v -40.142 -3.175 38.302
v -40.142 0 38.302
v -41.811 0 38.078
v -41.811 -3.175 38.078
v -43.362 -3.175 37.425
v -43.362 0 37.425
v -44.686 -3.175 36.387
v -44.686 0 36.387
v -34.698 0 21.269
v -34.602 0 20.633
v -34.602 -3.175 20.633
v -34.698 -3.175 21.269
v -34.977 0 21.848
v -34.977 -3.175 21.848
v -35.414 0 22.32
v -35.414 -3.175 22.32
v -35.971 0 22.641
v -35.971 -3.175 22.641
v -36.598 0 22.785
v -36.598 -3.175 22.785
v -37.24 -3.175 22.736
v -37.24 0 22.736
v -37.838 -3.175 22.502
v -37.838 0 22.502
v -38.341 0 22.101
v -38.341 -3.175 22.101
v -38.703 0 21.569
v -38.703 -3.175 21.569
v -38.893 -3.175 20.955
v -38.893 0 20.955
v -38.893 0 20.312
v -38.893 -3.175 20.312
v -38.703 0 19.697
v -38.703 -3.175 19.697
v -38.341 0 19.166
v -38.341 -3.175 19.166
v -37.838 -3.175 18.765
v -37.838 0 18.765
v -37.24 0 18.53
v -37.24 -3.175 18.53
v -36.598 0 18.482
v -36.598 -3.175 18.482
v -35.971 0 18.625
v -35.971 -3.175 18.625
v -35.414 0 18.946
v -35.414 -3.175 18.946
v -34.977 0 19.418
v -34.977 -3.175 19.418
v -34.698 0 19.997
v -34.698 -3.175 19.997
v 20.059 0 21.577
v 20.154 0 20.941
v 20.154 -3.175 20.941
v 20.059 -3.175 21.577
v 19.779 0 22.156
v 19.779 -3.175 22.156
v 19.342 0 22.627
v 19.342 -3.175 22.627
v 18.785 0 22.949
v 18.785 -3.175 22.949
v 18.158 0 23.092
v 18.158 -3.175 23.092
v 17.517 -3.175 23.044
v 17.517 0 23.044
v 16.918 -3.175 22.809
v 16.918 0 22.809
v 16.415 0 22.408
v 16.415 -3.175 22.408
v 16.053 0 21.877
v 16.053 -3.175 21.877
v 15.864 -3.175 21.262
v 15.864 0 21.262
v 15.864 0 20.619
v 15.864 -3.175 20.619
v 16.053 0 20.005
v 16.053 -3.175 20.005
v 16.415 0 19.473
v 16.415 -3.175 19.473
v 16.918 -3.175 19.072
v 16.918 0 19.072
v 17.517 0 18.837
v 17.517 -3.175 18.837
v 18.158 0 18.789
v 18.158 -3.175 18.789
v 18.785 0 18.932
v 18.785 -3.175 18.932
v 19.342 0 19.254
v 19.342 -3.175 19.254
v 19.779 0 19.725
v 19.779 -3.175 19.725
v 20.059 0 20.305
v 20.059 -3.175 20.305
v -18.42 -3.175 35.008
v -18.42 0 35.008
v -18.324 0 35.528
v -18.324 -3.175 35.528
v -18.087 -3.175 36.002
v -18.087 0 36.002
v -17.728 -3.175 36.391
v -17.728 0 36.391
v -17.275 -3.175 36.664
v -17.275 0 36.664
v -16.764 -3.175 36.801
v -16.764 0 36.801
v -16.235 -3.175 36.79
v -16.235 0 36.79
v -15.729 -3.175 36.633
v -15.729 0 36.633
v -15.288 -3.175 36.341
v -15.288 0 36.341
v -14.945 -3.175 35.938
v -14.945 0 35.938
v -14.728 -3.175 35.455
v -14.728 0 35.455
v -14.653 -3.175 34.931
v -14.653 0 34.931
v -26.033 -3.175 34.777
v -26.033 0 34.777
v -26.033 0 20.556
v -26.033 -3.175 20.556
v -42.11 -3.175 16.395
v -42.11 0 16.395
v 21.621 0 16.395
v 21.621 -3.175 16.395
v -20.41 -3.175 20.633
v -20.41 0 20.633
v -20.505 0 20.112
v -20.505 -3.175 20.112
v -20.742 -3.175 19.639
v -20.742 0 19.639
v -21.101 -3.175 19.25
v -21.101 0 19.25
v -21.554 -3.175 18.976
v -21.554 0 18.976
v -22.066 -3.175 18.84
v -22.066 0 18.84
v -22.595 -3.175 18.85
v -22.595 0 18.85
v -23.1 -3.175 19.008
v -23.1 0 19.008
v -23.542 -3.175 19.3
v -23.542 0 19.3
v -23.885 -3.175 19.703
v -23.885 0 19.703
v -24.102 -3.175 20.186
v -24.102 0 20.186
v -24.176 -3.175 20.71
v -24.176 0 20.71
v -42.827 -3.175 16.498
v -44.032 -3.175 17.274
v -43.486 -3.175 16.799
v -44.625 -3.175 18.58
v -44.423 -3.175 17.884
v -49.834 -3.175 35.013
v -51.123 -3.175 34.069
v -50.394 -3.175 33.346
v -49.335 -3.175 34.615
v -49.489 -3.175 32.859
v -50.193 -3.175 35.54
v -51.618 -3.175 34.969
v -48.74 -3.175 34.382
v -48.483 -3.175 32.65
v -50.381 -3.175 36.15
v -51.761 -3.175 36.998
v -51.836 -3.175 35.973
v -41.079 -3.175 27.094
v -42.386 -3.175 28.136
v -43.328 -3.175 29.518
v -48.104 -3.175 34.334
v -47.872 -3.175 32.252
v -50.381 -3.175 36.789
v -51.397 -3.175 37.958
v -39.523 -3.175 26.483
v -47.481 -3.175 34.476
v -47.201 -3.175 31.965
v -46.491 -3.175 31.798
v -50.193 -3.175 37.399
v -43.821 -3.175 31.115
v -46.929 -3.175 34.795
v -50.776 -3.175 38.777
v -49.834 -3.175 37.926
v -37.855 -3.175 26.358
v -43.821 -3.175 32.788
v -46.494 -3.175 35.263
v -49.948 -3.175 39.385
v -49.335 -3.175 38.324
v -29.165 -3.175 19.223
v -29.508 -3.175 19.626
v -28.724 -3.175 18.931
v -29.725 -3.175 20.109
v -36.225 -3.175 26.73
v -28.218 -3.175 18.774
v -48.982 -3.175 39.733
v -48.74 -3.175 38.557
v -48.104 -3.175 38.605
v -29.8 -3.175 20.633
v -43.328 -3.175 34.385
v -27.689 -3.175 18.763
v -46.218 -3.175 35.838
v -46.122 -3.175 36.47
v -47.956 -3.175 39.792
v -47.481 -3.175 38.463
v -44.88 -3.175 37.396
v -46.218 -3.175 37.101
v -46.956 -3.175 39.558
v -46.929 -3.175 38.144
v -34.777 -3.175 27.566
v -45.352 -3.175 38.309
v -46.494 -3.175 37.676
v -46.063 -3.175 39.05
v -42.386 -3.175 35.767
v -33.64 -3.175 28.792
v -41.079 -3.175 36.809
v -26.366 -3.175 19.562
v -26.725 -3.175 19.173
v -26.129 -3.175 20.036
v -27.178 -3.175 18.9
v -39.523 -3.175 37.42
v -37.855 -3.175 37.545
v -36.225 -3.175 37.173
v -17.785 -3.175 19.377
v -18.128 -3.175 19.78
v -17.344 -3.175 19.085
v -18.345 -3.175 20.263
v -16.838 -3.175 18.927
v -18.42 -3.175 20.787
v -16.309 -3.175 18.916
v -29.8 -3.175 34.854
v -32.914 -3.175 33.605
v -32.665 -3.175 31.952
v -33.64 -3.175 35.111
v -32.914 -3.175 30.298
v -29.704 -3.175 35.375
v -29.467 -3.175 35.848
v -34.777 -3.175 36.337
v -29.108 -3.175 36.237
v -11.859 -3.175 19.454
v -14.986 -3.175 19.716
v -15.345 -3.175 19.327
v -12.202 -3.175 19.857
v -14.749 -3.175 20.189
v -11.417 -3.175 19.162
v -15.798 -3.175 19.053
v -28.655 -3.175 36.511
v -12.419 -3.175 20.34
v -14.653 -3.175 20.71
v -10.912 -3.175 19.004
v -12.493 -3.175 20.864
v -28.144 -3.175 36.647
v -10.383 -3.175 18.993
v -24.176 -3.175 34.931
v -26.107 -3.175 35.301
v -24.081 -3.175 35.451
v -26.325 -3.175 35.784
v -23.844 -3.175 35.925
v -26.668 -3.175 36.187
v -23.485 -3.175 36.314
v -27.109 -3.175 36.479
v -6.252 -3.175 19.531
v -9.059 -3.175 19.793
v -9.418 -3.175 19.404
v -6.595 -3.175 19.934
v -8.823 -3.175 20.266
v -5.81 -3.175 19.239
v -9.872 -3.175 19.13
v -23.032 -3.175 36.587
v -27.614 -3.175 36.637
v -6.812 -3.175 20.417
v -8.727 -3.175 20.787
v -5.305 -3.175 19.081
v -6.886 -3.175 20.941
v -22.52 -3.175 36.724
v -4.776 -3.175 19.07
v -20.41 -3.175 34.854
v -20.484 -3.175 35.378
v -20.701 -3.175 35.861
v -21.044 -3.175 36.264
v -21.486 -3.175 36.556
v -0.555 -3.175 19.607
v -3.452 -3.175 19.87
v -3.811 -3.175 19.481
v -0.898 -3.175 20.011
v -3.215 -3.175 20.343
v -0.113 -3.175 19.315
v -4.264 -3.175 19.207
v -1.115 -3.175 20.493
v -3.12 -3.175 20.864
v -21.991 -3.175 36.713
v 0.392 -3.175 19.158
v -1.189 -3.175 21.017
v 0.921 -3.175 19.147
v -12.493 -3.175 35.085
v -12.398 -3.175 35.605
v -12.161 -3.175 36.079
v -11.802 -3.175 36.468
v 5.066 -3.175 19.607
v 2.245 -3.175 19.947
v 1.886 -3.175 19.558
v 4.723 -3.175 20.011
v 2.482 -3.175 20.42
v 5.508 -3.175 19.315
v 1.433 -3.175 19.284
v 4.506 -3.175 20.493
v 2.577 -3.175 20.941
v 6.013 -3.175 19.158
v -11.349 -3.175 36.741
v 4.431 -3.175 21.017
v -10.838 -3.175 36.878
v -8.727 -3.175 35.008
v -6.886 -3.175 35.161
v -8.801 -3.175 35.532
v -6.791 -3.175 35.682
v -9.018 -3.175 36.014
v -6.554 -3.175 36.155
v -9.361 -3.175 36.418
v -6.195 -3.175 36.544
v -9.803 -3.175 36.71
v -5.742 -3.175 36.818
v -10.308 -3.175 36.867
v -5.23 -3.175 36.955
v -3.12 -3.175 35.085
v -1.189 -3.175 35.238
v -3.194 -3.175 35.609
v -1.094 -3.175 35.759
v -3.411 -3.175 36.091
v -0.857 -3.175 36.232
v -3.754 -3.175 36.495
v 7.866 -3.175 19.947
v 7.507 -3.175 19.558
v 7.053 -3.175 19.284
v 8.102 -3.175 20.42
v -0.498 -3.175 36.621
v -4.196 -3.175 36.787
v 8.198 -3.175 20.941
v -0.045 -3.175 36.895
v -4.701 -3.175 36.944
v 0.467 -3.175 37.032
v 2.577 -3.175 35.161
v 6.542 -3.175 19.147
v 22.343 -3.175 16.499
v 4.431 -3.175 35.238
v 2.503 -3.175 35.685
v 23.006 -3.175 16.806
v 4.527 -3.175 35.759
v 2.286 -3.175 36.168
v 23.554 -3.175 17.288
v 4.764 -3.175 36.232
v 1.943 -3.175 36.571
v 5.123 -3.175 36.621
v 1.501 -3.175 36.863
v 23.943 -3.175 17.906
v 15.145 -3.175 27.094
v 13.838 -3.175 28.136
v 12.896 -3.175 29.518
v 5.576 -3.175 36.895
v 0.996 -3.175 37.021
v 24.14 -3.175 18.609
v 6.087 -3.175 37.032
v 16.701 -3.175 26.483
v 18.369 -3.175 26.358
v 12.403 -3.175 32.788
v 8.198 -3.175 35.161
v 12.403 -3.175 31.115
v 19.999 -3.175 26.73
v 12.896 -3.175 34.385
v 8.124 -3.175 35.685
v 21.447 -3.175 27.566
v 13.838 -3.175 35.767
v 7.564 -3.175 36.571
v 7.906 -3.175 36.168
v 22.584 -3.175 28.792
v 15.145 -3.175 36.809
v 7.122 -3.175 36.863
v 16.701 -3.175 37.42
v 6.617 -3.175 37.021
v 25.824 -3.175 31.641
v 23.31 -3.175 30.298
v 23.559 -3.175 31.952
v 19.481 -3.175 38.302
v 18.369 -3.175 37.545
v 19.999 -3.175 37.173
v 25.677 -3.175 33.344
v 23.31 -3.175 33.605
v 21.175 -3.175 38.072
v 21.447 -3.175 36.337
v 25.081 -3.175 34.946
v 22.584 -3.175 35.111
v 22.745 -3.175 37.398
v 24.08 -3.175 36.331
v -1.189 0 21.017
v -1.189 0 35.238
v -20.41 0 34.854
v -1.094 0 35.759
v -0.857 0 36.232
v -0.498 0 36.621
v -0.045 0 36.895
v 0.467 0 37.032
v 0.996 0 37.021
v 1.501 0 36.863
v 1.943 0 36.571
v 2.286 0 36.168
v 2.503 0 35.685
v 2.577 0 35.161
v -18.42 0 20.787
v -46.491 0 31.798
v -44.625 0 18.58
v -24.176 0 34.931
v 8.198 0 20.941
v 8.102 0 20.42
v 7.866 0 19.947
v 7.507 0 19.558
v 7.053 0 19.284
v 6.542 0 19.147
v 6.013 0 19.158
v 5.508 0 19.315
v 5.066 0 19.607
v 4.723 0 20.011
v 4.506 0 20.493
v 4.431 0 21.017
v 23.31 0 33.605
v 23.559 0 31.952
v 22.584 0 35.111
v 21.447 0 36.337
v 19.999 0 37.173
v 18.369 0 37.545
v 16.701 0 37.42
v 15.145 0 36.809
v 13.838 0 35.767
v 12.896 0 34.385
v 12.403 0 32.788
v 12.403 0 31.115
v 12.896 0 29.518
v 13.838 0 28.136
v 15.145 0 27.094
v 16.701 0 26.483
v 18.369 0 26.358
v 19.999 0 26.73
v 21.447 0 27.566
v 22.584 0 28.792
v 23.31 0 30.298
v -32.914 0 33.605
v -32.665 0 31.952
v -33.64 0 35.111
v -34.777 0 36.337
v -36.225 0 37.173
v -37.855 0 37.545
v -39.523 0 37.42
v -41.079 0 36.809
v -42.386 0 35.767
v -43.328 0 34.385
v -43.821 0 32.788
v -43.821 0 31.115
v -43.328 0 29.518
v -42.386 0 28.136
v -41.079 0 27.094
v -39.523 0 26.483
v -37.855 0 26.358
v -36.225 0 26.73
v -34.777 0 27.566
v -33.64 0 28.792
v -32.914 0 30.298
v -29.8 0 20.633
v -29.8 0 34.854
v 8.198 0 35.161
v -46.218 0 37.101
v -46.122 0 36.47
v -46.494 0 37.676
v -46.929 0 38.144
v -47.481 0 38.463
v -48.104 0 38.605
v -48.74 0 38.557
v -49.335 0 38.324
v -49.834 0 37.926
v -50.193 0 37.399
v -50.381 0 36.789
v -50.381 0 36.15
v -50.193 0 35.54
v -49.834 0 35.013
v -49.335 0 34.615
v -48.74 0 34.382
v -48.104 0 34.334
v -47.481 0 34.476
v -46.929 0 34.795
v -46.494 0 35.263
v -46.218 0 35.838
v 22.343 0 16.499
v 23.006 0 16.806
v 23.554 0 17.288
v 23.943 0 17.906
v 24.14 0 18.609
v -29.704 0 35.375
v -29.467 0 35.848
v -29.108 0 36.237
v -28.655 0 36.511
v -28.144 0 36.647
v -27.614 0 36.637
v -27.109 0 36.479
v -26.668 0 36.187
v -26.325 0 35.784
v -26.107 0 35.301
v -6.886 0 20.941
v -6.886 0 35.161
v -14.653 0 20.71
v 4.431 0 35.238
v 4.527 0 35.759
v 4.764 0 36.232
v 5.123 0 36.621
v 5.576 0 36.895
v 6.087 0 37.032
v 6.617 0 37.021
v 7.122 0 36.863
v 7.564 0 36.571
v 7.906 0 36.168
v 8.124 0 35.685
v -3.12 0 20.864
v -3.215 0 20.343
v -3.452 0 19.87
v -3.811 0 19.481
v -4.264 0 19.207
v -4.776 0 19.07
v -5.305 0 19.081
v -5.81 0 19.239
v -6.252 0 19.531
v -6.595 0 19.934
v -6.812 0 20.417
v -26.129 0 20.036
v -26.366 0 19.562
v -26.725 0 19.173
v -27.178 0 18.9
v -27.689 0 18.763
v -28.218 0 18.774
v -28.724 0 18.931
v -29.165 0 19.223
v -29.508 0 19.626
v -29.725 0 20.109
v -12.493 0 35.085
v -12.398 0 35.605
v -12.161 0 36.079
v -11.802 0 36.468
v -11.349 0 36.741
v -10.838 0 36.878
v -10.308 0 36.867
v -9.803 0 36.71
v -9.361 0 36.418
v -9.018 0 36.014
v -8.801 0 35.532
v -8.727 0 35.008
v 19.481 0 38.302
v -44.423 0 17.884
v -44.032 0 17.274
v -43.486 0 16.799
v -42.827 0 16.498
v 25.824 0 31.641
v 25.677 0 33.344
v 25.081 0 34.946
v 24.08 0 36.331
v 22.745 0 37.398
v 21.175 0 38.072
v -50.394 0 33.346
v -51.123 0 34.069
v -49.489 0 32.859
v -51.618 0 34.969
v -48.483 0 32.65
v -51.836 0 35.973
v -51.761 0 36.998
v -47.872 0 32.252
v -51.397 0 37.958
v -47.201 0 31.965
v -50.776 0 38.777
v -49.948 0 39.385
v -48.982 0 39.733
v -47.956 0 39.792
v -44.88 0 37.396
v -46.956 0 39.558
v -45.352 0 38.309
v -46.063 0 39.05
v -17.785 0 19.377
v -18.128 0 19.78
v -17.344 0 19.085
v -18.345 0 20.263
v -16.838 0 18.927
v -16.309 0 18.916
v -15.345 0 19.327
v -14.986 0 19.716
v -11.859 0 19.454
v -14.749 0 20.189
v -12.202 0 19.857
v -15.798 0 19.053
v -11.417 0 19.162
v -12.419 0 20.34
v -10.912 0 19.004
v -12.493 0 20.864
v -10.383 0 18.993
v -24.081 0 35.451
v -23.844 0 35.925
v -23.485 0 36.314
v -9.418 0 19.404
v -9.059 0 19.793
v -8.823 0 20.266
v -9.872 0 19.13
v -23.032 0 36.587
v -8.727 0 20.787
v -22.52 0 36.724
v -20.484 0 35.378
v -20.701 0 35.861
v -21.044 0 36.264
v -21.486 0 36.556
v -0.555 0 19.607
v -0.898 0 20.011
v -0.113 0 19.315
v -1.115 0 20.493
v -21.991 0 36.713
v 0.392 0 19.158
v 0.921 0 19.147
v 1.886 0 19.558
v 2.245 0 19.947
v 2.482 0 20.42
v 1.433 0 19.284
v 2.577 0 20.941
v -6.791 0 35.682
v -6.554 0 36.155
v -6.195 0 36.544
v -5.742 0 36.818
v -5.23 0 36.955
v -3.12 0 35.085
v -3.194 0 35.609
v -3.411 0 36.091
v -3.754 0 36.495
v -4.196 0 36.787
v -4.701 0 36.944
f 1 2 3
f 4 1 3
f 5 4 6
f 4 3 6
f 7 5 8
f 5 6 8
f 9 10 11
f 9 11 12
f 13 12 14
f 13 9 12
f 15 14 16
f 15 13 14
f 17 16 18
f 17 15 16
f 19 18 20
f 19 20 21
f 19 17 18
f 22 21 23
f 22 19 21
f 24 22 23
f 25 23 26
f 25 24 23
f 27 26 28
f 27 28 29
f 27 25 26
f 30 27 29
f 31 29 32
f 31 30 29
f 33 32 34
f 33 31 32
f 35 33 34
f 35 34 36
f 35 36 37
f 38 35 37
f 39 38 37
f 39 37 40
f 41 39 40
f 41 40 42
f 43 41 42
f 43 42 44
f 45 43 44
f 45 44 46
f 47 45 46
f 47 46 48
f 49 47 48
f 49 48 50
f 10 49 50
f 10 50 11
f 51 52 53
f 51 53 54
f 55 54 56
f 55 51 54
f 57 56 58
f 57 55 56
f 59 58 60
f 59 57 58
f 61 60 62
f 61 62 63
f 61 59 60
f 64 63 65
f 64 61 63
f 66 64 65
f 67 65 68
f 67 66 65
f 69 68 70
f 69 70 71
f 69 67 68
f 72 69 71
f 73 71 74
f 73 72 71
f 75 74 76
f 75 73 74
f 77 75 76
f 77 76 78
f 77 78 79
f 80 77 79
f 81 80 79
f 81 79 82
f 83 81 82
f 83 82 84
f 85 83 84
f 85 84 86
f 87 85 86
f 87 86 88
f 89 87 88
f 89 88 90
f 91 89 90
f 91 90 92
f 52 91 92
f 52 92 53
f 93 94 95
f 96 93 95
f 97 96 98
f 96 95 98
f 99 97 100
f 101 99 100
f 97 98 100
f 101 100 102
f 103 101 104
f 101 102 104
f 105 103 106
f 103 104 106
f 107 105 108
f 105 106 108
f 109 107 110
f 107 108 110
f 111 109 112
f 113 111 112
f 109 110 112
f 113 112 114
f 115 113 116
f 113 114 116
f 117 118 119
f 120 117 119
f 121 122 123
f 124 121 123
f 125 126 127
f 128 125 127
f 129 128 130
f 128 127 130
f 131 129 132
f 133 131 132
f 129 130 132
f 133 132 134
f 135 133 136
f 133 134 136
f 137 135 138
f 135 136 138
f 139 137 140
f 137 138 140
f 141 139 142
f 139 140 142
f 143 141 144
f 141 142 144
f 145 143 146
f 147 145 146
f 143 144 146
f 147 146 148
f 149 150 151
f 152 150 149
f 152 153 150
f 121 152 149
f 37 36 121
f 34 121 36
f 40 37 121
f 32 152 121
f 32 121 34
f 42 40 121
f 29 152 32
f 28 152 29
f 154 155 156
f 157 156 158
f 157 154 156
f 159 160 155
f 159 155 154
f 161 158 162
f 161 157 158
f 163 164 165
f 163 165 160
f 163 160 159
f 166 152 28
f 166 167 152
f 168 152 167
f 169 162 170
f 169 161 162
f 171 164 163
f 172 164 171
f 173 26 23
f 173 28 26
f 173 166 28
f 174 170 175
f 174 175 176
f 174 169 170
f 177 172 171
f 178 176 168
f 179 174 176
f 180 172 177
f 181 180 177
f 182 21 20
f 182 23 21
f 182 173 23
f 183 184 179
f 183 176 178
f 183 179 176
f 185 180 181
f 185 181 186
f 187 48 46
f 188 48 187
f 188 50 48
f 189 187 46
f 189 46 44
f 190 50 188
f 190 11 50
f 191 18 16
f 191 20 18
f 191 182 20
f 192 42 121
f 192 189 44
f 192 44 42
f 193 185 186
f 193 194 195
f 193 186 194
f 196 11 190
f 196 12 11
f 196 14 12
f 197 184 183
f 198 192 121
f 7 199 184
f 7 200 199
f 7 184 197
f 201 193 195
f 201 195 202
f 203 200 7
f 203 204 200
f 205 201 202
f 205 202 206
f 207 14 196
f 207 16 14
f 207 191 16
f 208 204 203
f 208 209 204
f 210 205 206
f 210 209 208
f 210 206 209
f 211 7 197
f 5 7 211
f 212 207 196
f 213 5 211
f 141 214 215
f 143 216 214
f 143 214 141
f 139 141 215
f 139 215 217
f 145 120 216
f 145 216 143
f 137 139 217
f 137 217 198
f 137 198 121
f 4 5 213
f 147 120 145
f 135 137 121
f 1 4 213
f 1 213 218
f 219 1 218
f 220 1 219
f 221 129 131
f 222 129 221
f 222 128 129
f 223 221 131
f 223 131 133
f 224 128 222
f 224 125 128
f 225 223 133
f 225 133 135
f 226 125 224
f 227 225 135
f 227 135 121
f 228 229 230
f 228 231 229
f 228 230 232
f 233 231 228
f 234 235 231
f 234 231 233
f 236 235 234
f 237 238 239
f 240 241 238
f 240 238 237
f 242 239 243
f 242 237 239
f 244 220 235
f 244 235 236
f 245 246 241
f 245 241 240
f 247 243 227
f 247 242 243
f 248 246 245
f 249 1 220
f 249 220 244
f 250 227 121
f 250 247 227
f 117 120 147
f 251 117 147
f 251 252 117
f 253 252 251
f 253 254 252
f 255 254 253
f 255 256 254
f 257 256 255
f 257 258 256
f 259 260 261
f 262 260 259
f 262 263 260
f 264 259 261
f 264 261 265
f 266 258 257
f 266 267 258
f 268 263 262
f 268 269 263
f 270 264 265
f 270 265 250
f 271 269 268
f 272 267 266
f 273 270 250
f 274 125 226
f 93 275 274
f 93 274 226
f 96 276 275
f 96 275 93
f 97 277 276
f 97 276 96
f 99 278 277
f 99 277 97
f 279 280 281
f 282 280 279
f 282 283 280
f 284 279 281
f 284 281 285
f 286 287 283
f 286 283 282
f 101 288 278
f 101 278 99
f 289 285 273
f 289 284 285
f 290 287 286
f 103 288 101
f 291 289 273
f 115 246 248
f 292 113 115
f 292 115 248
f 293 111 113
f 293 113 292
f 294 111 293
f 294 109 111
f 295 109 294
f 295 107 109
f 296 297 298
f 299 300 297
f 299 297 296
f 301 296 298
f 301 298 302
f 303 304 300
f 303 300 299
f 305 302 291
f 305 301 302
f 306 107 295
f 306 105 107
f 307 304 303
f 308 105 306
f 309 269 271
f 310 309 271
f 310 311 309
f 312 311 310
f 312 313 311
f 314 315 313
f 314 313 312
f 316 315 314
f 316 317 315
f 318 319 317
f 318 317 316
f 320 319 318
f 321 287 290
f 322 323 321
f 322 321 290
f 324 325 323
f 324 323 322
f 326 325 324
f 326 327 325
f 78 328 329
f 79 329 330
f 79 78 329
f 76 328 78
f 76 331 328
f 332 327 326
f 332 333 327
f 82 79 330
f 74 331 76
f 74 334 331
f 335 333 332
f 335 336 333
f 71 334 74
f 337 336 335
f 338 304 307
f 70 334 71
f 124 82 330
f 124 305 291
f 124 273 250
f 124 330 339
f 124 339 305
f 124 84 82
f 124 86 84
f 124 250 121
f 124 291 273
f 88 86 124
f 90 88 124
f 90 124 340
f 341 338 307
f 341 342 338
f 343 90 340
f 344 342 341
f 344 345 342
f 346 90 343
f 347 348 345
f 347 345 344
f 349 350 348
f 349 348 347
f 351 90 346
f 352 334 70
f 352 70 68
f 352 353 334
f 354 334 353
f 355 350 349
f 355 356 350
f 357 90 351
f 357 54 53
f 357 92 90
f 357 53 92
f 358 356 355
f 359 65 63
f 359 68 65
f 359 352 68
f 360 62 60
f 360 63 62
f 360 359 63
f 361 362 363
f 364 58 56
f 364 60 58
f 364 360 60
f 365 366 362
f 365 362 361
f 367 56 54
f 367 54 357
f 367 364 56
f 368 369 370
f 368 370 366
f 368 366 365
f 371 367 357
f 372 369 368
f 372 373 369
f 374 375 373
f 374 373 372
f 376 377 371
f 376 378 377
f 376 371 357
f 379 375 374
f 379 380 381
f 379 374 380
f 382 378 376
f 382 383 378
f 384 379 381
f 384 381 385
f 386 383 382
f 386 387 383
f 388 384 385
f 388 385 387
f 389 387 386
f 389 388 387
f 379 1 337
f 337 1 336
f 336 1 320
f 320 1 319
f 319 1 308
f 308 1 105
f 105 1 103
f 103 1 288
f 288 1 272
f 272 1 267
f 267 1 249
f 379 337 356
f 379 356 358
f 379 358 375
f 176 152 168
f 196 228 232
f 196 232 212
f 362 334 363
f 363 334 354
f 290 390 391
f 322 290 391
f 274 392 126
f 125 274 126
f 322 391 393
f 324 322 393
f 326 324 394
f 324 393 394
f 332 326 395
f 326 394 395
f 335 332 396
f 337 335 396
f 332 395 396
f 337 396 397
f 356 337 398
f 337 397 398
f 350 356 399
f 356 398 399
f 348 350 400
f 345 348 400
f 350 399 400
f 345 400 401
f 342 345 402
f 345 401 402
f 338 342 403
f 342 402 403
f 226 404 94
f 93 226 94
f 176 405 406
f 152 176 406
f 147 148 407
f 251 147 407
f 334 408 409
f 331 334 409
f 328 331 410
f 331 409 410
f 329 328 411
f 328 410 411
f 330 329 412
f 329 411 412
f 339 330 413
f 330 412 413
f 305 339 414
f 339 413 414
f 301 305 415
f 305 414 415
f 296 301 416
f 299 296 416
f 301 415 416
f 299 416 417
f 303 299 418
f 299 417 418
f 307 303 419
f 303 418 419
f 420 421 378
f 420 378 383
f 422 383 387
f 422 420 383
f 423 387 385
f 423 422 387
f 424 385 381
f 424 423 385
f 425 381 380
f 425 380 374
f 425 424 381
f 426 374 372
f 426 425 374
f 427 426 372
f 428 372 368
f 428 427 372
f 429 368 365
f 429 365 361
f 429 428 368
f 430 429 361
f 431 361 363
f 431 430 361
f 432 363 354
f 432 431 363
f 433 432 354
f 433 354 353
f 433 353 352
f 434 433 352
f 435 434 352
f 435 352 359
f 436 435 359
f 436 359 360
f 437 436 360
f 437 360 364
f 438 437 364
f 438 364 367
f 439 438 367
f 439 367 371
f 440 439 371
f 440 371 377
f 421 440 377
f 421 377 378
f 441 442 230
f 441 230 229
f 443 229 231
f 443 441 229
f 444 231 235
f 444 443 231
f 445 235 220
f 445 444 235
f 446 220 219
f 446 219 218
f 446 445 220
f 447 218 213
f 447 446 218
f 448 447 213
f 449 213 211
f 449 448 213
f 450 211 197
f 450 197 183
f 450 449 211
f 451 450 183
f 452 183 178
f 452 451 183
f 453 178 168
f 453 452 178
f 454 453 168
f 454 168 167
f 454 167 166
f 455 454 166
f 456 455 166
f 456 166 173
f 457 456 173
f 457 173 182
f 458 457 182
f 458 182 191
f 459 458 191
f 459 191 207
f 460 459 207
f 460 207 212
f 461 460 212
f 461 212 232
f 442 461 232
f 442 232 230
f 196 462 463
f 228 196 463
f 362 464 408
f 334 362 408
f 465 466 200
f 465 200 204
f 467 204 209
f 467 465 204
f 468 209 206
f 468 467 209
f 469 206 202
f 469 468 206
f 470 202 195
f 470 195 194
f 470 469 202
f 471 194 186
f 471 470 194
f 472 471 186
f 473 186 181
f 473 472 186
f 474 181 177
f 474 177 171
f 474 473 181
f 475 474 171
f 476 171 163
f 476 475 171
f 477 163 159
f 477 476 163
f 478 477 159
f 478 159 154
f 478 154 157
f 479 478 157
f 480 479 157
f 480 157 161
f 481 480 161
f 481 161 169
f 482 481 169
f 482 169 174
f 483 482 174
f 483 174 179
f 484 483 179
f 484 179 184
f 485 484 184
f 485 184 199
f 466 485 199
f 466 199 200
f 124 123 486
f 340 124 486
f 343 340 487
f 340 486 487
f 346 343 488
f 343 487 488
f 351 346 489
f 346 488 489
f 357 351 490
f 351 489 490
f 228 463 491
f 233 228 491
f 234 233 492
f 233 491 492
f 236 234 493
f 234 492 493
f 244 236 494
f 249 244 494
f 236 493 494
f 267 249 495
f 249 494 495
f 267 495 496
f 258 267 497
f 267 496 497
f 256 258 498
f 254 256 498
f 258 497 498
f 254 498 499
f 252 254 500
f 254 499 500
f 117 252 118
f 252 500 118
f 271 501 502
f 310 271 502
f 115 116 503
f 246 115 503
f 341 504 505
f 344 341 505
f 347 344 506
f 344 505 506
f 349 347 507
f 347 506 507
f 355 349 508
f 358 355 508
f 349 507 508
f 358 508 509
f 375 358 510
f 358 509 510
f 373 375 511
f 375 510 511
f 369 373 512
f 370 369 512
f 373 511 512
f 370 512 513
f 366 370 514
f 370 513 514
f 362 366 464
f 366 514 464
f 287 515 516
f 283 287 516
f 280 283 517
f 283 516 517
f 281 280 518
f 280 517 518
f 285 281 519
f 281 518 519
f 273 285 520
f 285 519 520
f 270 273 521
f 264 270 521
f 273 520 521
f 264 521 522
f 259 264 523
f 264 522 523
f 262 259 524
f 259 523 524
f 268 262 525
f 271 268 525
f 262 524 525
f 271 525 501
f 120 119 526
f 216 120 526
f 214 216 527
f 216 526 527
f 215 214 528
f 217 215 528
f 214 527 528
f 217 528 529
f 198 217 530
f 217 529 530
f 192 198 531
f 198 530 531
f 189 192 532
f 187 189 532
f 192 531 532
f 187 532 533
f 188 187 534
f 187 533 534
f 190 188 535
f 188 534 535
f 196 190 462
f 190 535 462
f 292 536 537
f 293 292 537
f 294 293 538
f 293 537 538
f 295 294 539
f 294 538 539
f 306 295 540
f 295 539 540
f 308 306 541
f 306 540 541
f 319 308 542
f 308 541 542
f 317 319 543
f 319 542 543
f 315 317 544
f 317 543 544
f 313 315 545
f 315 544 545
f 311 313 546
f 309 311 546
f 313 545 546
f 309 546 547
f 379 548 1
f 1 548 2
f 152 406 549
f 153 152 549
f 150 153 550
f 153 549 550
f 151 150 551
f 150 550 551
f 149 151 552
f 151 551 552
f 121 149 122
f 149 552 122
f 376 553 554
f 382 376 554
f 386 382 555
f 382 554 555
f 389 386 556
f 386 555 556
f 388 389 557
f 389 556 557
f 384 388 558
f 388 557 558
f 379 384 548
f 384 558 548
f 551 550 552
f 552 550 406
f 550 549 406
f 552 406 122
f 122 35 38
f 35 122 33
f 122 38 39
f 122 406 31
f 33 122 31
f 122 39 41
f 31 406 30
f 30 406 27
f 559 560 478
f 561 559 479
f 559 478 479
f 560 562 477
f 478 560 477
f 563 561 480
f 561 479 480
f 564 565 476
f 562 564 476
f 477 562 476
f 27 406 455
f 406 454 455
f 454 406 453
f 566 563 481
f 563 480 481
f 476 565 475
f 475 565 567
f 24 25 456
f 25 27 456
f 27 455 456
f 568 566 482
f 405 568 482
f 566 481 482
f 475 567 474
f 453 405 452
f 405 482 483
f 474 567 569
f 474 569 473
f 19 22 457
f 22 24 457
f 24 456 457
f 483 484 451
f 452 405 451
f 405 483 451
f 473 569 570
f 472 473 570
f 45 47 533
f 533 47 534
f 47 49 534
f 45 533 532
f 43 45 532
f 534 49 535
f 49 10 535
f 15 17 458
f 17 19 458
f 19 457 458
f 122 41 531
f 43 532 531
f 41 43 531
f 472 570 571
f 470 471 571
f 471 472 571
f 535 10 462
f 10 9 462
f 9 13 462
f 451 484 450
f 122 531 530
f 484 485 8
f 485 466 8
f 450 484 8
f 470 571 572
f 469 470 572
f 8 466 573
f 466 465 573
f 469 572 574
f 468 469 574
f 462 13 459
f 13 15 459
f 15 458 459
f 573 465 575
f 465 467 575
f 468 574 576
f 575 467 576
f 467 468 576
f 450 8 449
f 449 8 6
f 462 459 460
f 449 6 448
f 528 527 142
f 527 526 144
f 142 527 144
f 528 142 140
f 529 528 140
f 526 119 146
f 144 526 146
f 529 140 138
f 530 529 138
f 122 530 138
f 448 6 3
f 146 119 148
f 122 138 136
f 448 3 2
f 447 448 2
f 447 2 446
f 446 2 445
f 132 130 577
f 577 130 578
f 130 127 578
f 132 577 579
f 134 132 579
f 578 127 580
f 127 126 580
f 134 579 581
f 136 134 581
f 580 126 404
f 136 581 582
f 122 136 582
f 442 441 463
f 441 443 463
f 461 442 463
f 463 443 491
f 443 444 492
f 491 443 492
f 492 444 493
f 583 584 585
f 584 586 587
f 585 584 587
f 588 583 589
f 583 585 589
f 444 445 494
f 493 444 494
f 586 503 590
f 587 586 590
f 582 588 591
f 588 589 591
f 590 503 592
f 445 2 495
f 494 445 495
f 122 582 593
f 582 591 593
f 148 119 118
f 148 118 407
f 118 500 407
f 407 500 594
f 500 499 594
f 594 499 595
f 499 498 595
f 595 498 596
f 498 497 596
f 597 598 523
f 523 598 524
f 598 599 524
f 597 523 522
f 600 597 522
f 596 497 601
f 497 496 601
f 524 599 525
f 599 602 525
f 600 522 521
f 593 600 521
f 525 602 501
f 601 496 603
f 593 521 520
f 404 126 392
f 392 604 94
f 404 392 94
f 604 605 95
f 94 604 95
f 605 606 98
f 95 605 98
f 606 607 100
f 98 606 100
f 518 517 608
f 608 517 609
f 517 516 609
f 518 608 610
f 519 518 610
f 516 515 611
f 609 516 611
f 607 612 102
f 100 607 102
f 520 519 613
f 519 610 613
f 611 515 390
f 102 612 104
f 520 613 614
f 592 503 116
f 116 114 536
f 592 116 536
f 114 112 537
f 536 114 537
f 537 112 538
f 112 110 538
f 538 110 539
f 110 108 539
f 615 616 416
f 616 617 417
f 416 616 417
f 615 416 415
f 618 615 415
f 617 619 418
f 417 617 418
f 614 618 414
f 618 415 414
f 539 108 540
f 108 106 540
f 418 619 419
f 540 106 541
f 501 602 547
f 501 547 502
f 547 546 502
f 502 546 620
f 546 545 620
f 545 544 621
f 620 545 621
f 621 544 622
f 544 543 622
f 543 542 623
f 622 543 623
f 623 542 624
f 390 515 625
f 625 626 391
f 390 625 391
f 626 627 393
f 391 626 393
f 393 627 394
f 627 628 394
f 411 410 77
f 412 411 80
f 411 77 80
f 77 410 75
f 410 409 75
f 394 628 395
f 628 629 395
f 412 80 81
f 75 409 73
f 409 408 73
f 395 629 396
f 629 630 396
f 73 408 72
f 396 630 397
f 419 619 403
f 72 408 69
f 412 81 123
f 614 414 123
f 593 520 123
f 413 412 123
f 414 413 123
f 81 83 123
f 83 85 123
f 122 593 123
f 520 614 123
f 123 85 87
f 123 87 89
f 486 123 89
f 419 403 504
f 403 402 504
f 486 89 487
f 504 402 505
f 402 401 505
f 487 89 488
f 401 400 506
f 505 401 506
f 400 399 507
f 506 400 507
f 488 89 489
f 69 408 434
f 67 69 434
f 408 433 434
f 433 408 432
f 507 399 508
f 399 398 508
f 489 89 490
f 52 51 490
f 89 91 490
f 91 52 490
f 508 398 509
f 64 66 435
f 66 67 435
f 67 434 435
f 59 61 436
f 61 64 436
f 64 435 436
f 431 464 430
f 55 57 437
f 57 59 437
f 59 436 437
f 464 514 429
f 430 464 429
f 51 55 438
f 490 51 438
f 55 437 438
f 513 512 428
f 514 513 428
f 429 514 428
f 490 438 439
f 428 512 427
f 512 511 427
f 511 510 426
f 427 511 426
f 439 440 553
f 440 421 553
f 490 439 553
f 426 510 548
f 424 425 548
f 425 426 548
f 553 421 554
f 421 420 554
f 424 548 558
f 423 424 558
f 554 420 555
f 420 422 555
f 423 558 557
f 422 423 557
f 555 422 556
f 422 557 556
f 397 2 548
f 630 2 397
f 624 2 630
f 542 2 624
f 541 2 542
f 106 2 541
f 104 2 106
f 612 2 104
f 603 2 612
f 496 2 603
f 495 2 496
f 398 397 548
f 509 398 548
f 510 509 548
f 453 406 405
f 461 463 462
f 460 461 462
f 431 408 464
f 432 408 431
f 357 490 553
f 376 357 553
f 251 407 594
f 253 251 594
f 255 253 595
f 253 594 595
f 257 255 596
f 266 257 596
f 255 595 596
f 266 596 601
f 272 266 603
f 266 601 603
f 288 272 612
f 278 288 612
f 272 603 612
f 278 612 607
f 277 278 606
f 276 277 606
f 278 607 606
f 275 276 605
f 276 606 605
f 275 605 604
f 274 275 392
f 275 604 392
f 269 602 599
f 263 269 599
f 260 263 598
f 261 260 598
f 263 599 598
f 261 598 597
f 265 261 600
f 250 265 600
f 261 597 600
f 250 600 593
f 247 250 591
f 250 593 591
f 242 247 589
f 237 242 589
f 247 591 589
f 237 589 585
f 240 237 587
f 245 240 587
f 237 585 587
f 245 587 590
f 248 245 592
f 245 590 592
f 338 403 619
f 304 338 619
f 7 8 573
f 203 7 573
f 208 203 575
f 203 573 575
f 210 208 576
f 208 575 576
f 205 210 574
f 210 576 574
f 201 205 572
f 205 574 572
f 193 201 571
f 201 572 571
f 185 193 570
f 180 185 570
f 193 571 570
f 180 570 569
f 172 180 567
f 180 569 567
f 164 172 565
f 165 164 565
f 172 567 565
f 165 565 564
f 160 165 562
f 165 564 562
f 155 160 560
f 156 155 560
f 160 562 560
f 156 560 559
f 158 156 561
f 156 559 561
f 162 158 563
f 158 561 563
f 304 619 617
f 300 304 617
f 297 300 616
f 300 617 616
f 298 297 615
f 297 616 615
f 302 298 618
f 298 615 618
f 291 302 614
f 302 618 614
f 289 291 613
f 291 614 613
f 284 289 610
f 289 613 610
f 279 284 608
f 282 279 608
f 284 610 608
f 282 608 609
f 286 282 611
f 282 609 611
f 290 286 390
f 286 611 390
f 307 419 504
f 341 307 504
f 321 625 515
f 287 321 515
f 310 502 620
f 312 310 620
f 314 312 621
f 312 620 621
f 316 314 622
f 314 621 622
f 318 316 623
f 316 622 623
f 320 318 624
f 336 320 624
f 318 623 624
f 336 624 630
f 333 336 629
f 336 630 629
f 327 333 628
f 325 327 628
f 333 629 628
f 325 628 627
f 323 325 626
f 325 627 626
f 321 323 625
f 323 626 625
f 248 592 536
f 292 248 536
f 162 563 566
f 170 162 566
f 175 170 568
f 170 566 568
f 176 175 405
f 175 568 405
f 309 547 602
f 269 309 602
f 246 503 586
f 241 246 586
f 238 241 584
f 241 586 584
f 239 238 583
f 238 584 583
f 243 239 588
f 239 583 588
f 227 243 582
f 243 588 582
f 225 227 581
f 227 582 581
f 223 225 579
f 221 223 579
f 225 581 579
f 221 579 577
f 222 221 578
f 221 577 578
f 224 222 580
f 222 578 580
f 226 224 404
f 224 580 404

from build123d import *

# Parameters (mm, degrees)
F0_R     = 2.157429
F0_R_2   = 5.60947
F1_DEPTH = 3.175
F0_R_3   = 2.141456
F2_DEPTH = 0.004921
F3_DEPTH = 3.175


with BuildPart() as f1:
    # F0 (on Front) → F1 (new body)
    with BuildSketch(Plane.XZ):
        with BuildLine():
            Line((19.481216, 38.301506), (-40.142396, 38.301506))
            ThreePointArc((-40.142396, 38.301506), (-42.607797, 37.803368), (-44.686392, 36.387111))
            ThreePointArc((-44.686392, 36.387111), (-46.052064, 34.274936), (-46.490546, 31.798229))
            Line((-46.490546, 31.798229), (-44.625234, 18.579618))
            ThreePointArc((-44.625234, 18.579618), (-43.776004, 17.017098), (-42.110151, 16.394528))
            Line((-42.110151, 16.394528), (21.620648, 16.394528))
            ThreePointArc((21.620648, 16.394528), (23.297675, 17.026865), (24.139706, 18.609033))
            Line((24.139706, 18.609033), (25.823629, 31.641185))
            ThreePointArc((25.823629, 31.641185), (24.07975, 36.330545), (19.481216, 38.301506))
        make_face()
        with Locations((-36.75957, 20.633117)):
            Circle(F0_R, mode=Mode.SUBTRACT)
        with BuildLine():
            Line((-29.799683, 20.633117), (-29.799683, 34.853889))
            ThreePointArc((-29.799683, 34.853889), (-27.878732, 36.660702), (-26.0331, 34.777018))
            Line((-26.0331, 34.777018), (-26.0331, 20.556246))
            ThreePointArc((-26.0331, 20.556246), (-27.954051, 18.749433), (-29.799683, 20.633117))
        make_face(mode=Mode.SUBTRACT)
        with BuildLine():
            Line((-24.176236, 20.709988), (-24.176236, 34.93076))
            ThreePointArc((-24.176236, 34.93076), (-22.255285, 36.737572), (-20.409653, 34.853889))
            Line((-20.409653, 34.853889), (-20.409653, 20.633116))
            ThreePointArc((-20.409653, 20.633116), (-22.330604, 18.826304), (-24.176236, 20.709988))
        make_face(mode=Mode.SUBTRACT)
        with BuildLine():
            Line((-18.419787, 20.786859), (-18.419787, 35.007631))
            ThreePointArc((-18.419787, 35.007631), (-16.498836, 36.814444), (-14.653204, 34.93076))
            Line((-14.653204, 34.93076), (-14.653204, 20.709988))
            ThreePointArc((-14.653204, 20.709988), (-16.574155, 18.903175), (-18.419787, 20.786859))
        make_face(mode=Mode.SUBTRACT)
        with Locations((17.996946, 20.940602)):
            Circle(F0_R, mode=Mode.SUBTRACT)
        with BuildLine():
            Line((-12.493486, 20.86373), (-12.493486, 35.084503))
            ThreePointArc((-12.493486, 35.084503), (-10.572535, 36.891315), (-8.726902, 35.007631))
            Line((-8.726902, 35.007631), (-8.726902, 20.786859))
            ThreePointArc((-8.726902, 20.786859), (-10.647853, 18.980047), (-12.493486, 20.86373))
        make_face(mode=Mode.SUBTRACT)
        with BuildLine():
            Line((-6.886294, 20.940602), (-6.886294, 35.161374))
            ThreePointArc((-6.886294, 35.161374), (-4.965343, 36.968187), (-3.11971, 35.084503))
            Line((-3.11971, 35.084503), (-3.11971, 20.86373))
            ThreePointArc((-3.11971, 20.86373), (-5.040661, 19.056918), (-6.886294, 20.940602))
        make_face(mode=Mode.SUBTRACT)
        with BuildLine():
            Line((-1.18931, 21.017473), (-1.18931, 35.238246))
            ThreePointArc((-1.18931, 35.238246), (0.73164, 37.045058), (2.577273, 35.161374))
            Line((2.577273, 35.161374), (2.577273, 20.940602))
            ThreePointArc((2.577273, 20.940602), (0.656322, 19.133789), (-1.18931, 21.017473))
        make_face(mode=Mode.SUBTRACT)
        with BuildLine():
            Line((4.431474, 21.017473), (4.431474, 35.238246))
            ThreePointArc((4.431474, 35.238246), (6.352424, 37.045058), (8.198057, 35.161374))
            Line((8.198057, 35.161374), (8.198057, 20.940602))
            ThreePointArc((8.198057, 20.940602), (6.277106, 19.133789), (4.431474, 21.017473))
        make_face(mode=Mode.SUBTRACT)
        with Locations((-38.274463, 31.951506)):
            Circle(F0_R_2, mode=Mode.SUBTRACT)
        with Locations((17.949626, 31.951506)):
            Circle(F0_R_2, mode=Mode.SUBTRACT)
    extrude(amount=F1_DEPTH)

    # F0 (on Front) → F2 (join)
    with BuildSketch(Plane.XZ):
        with BuildLine():
            Line((19.481216, 38.301506), (-40.142396, 38.301506))
            ThreePointArc((-40.142396, 38.301506), (-42.607797, 37.803368), (-44.686392, 36.387111))
            ThreePointArc((-44.686392, 36.387111), (-46.052064, 34.274936), (-46.490546, 31.798229))
            Line((-46.490546, 31.798229), (-44.625234, 18.579618))
            ThreePointArc((-44.625234, 18.579618), (-43.776004, 17.017098), (-42.110151, 16.394528))
            Line((-42.110151, 16.394528), (21.620648, 16.394528))
            ThreePointArc((21.620648, 16.394528), (23.297675, 17.026865), (24.139706, 18.609033))
            Line((24.139706, 18.609033), (25.823629, 31.641185))
            ThreePointArc((25.823629, 31.641185), (24.07975, 36.330545), (19.481216, 38.301506))
        make_face()
        with Locations((-36.75957, 20.633117)):
            Circle(F0_R, mode=Mode.SUBTRACT)
        with BuildLine():
            Line((-29.799683, 20.633117), (-29.799683, 34.853889))
            ThreePointArc((-29.799683, 34.853889), (-27.878732, 36.660702), (-26.0331, 34.777018))
            Line((-26.0331, 34.777018), (-26.0331, 20.556246))
            ThreePointArc((-26.0331, 20.556246), (-27.954051, 18.749433), (-29.799683, 20.633117))
        make_face(mode=Mode.SUBTRACT)
        with BuildLine():
            Line((-24.176236, 20.709988), (-24.176236, 34.93076))
            ThreePointArc((-24.176236, 34.93076), (-22.255285, 36.737572), (-20.409653, 34.853889))
            Line((-20.409653, 34.853889), (-20.409653, 20.633116))
            ThreePointArc((-20.409653, 20.633116), (-22.330604, 18.826304), (-24.176236, 20.709988))
        make_face(mode=Mode.SUBTRACT)
        with BuildLine():
            Line((-18.419787, 20.786859), (-18.419787, 35.007631))
            ThreePointArc((-18.419787, 35.007631), (-16.498836, 36.814444), (-14.653204, 34.93076))
            Line((-14.653204, 34.93076), (-14.653204, 20.709988))
            ThreePointArc((-14.653204, 20.709988), (-16.574155, 18.903175), (-18.419787, 20.786859))
        make_face(mode=Mode.SUBTRACT)
        with Locations((17.996946, 20.940602)):
            Circle(F0_R, mode=Mode.SUBTRACT)
        with BuildLine():
            Line((-12.493486, 20.86373), (-12.493486, 35.084503))
            ThreePointArc((-12.493486, 35.084503), (-10.572535, 36.891315), (-8.726902, 35.007631))
            Line((-8.726902, 35.007631), (-8.726902, 20.786859))
            ThreePointArc((-8.726902, 20.786859), (-10.647853, 18.980047), (-12.493486, 20.86373))
        make_face(mode=Mode.SUBTRACT)
        with BuildLine():
            Line((-6.886294, 20.940602), (-6.886294, 35.161374))
            ThreePointArc((-6.886294, 35.161374), (-4.965343, 36.968187), (-3.11971, 35.084503))
            Line((-3.11971, 35.084503), (-3.11971, 20.86373))
            ThreePointArc((-3.11971, 20.86373), (-5.040661, 19.056918), (-6.886294, 20.940602))
        make_face(mode=Mode.SUBTRACT)
        with BuildLine():
            Line((-1.18931, 21.017473), (-1.18931, 35.238246))
            ThreePointArc((-1.18931, 35.238246), (0.73164, 37.045058), (2.577273, 35.161374))
            Line((2.577273, 35.161374), (2.577273, 20.940602))
            ThreePointArc((2.577273, 20.940602), (0.656322, 19.133789), (-1.18931, 21.017473))
        make_face(mode=Mode.SUBTRACT)
        with BuildLine():
            Line((4.431474, 21.017473), (4.431474, 35.238246))
            ThreePointArc((4.431474, 35.238246), (6.352424, 37.045058), (8.198057, 35.161374))
            Line((8.198057, 35.161374), (8.198057, 20.940602))
            ThreePointArc((8.198057, 20.940602), (6.277106, 19.133789), (4.431474, 21.017473))
        make_face(mode=Mode.SUBTRACT)
        with Locations((-38.274463, 31.951506)):
            Circle(F0_R_2, mode=Mode.SUBTRACT)
        with Locations((17.949626, 31.951506)):
            Circle(F0_R_2, mode=Mode.SUBTRACT)
        with BuildLine():
            ThreePointArc((-46.490546, 31.798229), (-46.052064, 34.274936), (-44.686392, 36.387111))
            ThreePointArc((-44.686392, 36.387111), (-50.775954, 38.77664), (-48.483074, 32.650033))
            ThreePointArc((-48.483074, 32.650033), (-47.542505, 32.09385), (-46.490546, 31.798229))
        make_face()
        with Locations((-48.263825, 36.469538)):
            Circle(F0_R_3, mode=Mode.SUBTRACT)
    extrude(amount=F2_DEPTH)

    # F0 (on Front) → F3 (join)
    with BuildSketch(Plane.XZ):
        with BuildLine():
            Line((19.481216, 38.301506), (-40.142396, 38.301506))
            ThreePointArc((-40.142396, 38.301506), (-42.607797, 37.803368), (-44.686392, 36.387111))
            ThreePointArc((-44.686392, 36.387111), (-46.052064, 34.274936), (-46.490546, 31.798229))
            Line((-46.490546, 31.798229), (-44.625234, 18.579618))
            ThreePointArc((-44.625234, 18.579618), (-43.776004, 17.017098), (-42.110151, 16.394528))
            Line((-42.110151, 16.394528), (21.620648, 16.394528))
            ThreePointArc((21.620648, 16.394528), (23.297675, 17.026865), (24.139706, 18.609033))
            Line((24.139706, 18.609033), (25.823629, 31.641185))
            ThreePointArc((25.823629, 31.641185), (24.07975, 36.330545), (19.481216, 38.301506))
        make_face()
        with Locations((-36.75957, 20.633117)):
            Circle(F0_R, mode=Mode.SUBTRACT)
        with BuildLine():
            Line((-29.799683, 20.633117), (-29.799683, 34.853889))
            ThreePointArc((-29.799683, 34.853889), (-27.878732, 36.660702), (-26.0331, 34.777018))
            Line((-26.0331, 34.777018), (-26.0331, 20.556246))
            ThreePointArc((-26.0331, 20.556246), (-27.954051, 18.749433), (-29.799683, 20.633117))
        make_face(mode=Mode.SUBTRACT)
        with BuildLine():
            Line((-24.176236, 20.709988), (-24.176236, 34.93076))
            ThreePointArc((-24.176236, 34.93076), (-22.255285, 36.737572), (-20.409653, 34.853889))
            Line((-20.409653, 34.853889), (-20.409653, 20.633116))
            ThreePointArc((-20.409653, 20.633116), (-22.330604, 18.826304), (-24.176236, 20.709988))
        make_face(mode=Mode.SUBTRACT)
        with BuildLine():
            Line((-18.419787, 20.786859), (-18.419787, 35.007631))
            ThreePointArc((-18.419787, 35.007631), (-16.498836, 36.814444), (-14.653204, 34.93076))
            Line((-14.653204, 34.93076), (-14.653204, 20.709988))
            ThreePointArc((-14.653204, 20.709988), (-16.574155, 18.903175), (-18.419787, 20.786859))
        make_face(mode=Mode.SUBTRACT)
        with Locations((17.996946, 20.940602)):
            Circle(F0_R, mode=Mode.SUBTRACT)
        with BuildLine():
            Line((-12.493486, 20.86373), (-12.493486, 35.084503))
            ThreePointArc((-12.493486, 35.084503), (-10.572535, 36.891315), (-8.726902, 35.007631))
            Line((-8.726902, 35.007631), (-8.726902, 20.786859))
            ThreePointArc((-8.726902, 20.786859), (-10.647853, 18.980047), (-12.493486, 20.86373))
        make_face(mode=Mode.SUBTRACT)
        with BuildLine():
            Line((-6.886294, 20.940602), (-6.886294, 35.161374))
            ThreePointArc((-6.886294, 35.161374), (-4.965343, 36.968187), (-3.11971, 35.084503))
            Line((-3.11971, 35.084503), (-3.11971, 20.86373))
            ThreePointArc((-3.11971, 20.86373), (-5.040661, 19.056918), (-6.886294, 20.940602))
        make_face(mode=Mode.SUBTRACT)
        with BuildLine():
            Line((-1.18931, 21.017473), (-1.18931, 35.238246))
            ThreePointArc((-1.18931, 35.238246), (0.73164, 37.045058), (2.577273, 35.161374))
            Line((2.577273, 35.161374), (2.577273, 20.940602))
            ThreePointArc((2.577273, 20.940602), (0.656322, 19.133789), (-1.18931, 21.017473))
        make_face(mode=Mode.SUBTRACT)
        with BuildLine():
            Line((4.431474, 21.017473), (4.431474, 35.238246))
            ThreePointArc((4.431474, 35.238246), (6.352424, 37.045058), (8.198057, 35.161374))
            Line((8.198057, 35.161374), (8.198057, 20.940602))
            ThreePointArc((8.198057, 20.940602), (6.277106, 19.133789), (4.431474, 21.017473))
        make_face(mode=Mode.SUBTRACT)
        with Locations((-38.274463, 31.951506)):
            Circle(F0_R_2, mode=Mode.SUBTRACT)
        with Locations((17.949626, 31.951506)):
            Circle(F0_R_2, mode=Mode.SUBTRACT)
        with BuildLine():
            ThreePointArc((-46.490546, 31.798229), (-46.052064, 34.274936), (-44.686392, 36.387111))
            ThreePointArc((-44.686392, 36.387111), (-50.775954, 38.77664), (-48.483074, 32.650033))
            ThreePointArc((-48.483074, 32.650033), (-47.542505, 32.09385), (-46.490546, 31.798229))
        make_face()
        with Locations((-48.263825, 36.469538)):
            Circle(F0_R_3, mode=Mode.SUBTRACT)
    extrude(amount=F3_DEPTH)


solid = f1.part
